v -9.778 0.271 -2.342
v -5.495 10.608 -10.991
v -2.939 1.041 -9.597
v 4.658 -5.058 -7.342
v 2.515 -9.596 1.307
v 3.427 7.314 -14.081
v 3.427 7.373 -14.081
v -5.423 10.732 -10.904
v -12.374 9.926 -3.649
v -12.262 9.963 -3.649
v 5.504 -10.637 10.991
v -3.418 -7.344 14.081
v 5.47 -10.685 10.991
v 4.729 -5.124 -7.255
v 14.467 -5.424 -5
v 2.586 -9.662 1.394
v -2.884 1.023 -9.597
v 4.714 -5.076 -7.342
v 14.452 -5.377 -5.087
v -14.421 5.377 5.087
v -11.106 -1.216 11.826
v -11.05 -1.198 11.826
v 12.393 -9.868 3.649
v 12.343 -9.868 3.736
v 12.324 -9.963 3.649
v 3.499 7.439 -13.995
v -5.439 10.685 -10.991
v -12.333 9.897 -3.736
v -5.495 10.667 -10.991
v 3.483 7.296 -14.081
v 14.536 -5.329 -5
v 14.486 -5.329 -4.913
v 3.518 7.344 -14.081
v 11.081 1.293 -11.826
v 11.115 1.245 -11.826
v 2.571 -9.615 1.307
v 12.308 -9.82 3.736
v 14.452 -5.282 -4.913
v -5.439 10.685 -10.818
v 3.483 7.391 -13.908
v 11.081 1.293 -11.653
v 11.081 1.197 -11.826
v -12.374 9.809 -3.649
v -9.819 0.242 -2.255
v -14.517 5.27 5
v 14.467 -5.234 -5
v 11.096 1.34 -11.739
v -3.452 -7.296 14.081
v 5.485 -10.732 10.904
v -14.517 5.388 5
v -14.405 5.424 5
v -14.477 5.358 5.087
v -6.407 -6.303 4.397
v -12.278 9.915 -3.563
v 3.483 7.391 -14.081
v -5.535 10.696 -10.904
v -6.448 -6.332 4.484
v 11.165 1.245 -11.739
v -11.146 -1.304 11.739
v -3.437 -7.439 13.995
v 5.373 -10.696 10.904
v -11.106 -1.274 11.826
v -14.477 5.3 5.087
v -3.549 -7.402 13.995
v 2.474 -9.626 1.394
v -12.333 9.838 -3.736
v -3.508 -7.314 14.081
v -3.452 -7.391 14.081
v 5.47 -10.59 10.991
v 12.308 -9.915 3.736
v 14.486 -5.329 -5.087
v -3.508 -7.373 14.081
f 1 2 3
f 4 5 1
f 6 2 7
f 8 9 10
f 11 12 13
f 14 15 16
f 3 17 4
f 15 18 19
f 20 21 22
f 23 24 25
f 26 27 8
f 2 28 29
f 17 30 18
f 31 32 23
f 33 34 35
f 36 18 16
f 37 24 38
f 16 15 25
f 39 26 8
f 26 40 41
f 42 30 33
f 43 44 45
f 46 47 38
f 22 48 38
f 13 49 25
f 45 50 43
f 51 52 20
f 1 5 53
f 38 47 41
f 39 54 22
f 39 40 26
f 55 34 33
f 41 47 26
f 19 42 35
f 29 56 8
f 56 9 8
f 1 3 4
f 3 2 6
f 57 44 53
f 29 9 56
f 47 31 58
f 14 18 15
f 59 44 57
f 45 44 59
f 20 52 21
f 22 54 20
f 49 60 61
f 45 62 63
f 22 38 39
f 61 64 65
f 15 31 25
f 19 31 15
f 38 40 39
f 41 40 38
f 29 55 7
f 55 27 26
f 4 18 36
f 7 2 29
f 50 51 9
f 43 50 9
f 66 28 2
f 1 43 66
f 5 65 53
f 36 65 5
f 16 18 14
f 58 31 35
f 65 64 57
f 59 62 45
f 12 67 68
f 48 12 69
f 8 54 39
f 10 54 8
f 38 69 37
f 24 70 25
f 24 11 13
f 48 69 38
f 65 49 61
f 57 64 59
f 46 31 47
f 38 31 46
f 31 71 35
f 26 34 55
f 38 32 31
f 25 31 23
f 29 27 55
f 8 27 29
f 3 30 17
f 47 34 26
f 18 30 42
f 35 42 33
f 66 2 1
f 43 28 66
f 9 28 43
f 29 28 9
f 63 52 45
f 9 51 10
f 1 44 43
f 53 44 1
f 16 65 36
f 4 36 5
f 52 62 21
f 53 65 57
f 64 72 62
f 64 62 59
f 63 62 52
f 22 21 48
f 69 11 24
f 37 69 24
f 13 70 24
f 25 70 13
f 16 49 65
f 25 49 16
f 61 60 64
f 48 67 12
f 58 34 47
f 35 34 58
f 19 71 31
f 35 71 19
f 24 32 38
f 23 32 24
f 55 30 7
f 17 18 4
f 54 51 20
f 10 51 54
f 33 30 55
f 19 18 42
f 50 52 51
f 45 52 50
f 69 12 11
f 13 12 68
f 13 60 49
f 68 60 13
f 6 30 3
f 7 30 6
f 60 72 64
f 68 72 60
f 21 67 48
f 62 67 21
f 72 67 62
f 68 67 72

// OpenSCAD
// Auto-generated OpenSCAD file

    inner_points = 10*[[-1.4436247026081666, 0.53290472179478, 0.5000000000005375], [1.4436191328390864, -0.5329090469609368, -0.5000000000005375], [-1.1065387952767085, -0.12450860318088203, 1.1739293814812473], [-1.2292961042735038, 0.9867657297769106, -0.36491238710543017], [1.2292905345044236, -0.9867700549430674, 0.36491238710543017], [1.1065332255076283, 0.12450427801472524, -1.1739293814812473], [-0.3467937417511487, -0.7343646996664531, 1.3994576396282619], [-0.5454192400754369, 1.0637149418846232, -1.0904406452529822], [0.5454136703063569, -1.06371926705078, 1.0904406452529822], [0.3467881719820686, 0.7343603745002963, -1.3994576396282619], [-0.9737754103851414, 0.030062411297536226, -0.22552825814749344], [0.4698465073384851, -0.5028444730803222, -0.7255282581480309], [-0.6366895030536831, -0.6273509136781259, 0.44840112333321624], [0.25551790900382226, -0.9567054810624528, 0.13938412895793664], [-0.28989854618707456, 0.10701162340524878, -0.9510565162950456]];

    outer_points = 10*[[1.5631233177982589, 0.0, 0.4179467455373456], [-1.5631233177982589, 0.0, -0.4179467455373456], [1.4296084444676138, 0.7045531263704787, -0.27903149710806596], [1.0995782123374722, -0.7045531263704787, 0.9552835368748945], [-1.0995782123374722, 0.7045531263704787, -0.9552835368748945], [-1.4296084444676138, -0.7045531263704787, 0.27903149710806596], [0.750031735954207, 1.1399909053474344, -0.8694291917899644], [0.2160316030526203, -1.1399909053474344, 1.1277344860194474], [-0.2160316030526203, 1.1399909053474344, -1.1277344860194474], [-0.750031735954207, -1.1399909053474344, 0.8694291917899644], [0.8365540911892785, -0.5478743958362549, 0.0033013484425665762], [-0.7265692266089804, -0.5478743958362549, -0.41464539709477904], [0.7030392178586335, 0.1566787305342239, -0.6936768942028451], [-0.26302412114819385, 0.1566787305342239, -0.9519821884323281], [-0.04699251809557352, -0.9833121748132105, 0.1757522975871193]];

    // Convex hull for inner set (I)
    module inner_hull() {
        hull() {
            for (p = inner_points) {
                translate(p) sphere(r=0.1);
            }
        }
    }

    // Convex hull for outer set (O) minus inner hull (O \ I)
    module outer_minus_inner() {
        difference() {
            hull() {
                for (p = outer_points) {
                    translate(p) sphere(r=0.1);
                }
            }
            inner_hull(); // Subtract inner hull
        }
    }

    // Convex hull for outer set (O) minus all translated inner hulls
    module outer_minus_AllTranslationInner() {
        difference() {
            hull() {
                for (p = outer_points) {
                    translate(p) sphere(r=0.1);
                }
            }
            hull() {
                translate([0,0,50]) inner_hull();
                translate([0,0,-50]) inner_hull();
            }; // Subtract translated inner hulls
        }
    }

    // Difference between outer_minus_inner and outer_minus_AllTranslationInner
    module outer_minus_inner_diff() {
        difference() {
            // Outer minus inner
            difference() {
                hull() {
                    for (p = outer_points) {
                        translate(p) sphere(r=0.1);
                    }
                }
                inner_hull();
            }

            // Subtract Outer minus AllTranslationInner
            difference() {
                hull() {
                    for (p = outer_points) {
                        translate(p) sphere(r=0.1);
                    }
                }
                hull() {
                    translate([0,0,50]) inner_hull();
                    translate([0,0,-50]) inner_hull();
                };
            }
        }
    }

    // Rendering all with colors applied
    color([1, 0, 0, 0.5]) inner_hull(); // Transparent red
    
